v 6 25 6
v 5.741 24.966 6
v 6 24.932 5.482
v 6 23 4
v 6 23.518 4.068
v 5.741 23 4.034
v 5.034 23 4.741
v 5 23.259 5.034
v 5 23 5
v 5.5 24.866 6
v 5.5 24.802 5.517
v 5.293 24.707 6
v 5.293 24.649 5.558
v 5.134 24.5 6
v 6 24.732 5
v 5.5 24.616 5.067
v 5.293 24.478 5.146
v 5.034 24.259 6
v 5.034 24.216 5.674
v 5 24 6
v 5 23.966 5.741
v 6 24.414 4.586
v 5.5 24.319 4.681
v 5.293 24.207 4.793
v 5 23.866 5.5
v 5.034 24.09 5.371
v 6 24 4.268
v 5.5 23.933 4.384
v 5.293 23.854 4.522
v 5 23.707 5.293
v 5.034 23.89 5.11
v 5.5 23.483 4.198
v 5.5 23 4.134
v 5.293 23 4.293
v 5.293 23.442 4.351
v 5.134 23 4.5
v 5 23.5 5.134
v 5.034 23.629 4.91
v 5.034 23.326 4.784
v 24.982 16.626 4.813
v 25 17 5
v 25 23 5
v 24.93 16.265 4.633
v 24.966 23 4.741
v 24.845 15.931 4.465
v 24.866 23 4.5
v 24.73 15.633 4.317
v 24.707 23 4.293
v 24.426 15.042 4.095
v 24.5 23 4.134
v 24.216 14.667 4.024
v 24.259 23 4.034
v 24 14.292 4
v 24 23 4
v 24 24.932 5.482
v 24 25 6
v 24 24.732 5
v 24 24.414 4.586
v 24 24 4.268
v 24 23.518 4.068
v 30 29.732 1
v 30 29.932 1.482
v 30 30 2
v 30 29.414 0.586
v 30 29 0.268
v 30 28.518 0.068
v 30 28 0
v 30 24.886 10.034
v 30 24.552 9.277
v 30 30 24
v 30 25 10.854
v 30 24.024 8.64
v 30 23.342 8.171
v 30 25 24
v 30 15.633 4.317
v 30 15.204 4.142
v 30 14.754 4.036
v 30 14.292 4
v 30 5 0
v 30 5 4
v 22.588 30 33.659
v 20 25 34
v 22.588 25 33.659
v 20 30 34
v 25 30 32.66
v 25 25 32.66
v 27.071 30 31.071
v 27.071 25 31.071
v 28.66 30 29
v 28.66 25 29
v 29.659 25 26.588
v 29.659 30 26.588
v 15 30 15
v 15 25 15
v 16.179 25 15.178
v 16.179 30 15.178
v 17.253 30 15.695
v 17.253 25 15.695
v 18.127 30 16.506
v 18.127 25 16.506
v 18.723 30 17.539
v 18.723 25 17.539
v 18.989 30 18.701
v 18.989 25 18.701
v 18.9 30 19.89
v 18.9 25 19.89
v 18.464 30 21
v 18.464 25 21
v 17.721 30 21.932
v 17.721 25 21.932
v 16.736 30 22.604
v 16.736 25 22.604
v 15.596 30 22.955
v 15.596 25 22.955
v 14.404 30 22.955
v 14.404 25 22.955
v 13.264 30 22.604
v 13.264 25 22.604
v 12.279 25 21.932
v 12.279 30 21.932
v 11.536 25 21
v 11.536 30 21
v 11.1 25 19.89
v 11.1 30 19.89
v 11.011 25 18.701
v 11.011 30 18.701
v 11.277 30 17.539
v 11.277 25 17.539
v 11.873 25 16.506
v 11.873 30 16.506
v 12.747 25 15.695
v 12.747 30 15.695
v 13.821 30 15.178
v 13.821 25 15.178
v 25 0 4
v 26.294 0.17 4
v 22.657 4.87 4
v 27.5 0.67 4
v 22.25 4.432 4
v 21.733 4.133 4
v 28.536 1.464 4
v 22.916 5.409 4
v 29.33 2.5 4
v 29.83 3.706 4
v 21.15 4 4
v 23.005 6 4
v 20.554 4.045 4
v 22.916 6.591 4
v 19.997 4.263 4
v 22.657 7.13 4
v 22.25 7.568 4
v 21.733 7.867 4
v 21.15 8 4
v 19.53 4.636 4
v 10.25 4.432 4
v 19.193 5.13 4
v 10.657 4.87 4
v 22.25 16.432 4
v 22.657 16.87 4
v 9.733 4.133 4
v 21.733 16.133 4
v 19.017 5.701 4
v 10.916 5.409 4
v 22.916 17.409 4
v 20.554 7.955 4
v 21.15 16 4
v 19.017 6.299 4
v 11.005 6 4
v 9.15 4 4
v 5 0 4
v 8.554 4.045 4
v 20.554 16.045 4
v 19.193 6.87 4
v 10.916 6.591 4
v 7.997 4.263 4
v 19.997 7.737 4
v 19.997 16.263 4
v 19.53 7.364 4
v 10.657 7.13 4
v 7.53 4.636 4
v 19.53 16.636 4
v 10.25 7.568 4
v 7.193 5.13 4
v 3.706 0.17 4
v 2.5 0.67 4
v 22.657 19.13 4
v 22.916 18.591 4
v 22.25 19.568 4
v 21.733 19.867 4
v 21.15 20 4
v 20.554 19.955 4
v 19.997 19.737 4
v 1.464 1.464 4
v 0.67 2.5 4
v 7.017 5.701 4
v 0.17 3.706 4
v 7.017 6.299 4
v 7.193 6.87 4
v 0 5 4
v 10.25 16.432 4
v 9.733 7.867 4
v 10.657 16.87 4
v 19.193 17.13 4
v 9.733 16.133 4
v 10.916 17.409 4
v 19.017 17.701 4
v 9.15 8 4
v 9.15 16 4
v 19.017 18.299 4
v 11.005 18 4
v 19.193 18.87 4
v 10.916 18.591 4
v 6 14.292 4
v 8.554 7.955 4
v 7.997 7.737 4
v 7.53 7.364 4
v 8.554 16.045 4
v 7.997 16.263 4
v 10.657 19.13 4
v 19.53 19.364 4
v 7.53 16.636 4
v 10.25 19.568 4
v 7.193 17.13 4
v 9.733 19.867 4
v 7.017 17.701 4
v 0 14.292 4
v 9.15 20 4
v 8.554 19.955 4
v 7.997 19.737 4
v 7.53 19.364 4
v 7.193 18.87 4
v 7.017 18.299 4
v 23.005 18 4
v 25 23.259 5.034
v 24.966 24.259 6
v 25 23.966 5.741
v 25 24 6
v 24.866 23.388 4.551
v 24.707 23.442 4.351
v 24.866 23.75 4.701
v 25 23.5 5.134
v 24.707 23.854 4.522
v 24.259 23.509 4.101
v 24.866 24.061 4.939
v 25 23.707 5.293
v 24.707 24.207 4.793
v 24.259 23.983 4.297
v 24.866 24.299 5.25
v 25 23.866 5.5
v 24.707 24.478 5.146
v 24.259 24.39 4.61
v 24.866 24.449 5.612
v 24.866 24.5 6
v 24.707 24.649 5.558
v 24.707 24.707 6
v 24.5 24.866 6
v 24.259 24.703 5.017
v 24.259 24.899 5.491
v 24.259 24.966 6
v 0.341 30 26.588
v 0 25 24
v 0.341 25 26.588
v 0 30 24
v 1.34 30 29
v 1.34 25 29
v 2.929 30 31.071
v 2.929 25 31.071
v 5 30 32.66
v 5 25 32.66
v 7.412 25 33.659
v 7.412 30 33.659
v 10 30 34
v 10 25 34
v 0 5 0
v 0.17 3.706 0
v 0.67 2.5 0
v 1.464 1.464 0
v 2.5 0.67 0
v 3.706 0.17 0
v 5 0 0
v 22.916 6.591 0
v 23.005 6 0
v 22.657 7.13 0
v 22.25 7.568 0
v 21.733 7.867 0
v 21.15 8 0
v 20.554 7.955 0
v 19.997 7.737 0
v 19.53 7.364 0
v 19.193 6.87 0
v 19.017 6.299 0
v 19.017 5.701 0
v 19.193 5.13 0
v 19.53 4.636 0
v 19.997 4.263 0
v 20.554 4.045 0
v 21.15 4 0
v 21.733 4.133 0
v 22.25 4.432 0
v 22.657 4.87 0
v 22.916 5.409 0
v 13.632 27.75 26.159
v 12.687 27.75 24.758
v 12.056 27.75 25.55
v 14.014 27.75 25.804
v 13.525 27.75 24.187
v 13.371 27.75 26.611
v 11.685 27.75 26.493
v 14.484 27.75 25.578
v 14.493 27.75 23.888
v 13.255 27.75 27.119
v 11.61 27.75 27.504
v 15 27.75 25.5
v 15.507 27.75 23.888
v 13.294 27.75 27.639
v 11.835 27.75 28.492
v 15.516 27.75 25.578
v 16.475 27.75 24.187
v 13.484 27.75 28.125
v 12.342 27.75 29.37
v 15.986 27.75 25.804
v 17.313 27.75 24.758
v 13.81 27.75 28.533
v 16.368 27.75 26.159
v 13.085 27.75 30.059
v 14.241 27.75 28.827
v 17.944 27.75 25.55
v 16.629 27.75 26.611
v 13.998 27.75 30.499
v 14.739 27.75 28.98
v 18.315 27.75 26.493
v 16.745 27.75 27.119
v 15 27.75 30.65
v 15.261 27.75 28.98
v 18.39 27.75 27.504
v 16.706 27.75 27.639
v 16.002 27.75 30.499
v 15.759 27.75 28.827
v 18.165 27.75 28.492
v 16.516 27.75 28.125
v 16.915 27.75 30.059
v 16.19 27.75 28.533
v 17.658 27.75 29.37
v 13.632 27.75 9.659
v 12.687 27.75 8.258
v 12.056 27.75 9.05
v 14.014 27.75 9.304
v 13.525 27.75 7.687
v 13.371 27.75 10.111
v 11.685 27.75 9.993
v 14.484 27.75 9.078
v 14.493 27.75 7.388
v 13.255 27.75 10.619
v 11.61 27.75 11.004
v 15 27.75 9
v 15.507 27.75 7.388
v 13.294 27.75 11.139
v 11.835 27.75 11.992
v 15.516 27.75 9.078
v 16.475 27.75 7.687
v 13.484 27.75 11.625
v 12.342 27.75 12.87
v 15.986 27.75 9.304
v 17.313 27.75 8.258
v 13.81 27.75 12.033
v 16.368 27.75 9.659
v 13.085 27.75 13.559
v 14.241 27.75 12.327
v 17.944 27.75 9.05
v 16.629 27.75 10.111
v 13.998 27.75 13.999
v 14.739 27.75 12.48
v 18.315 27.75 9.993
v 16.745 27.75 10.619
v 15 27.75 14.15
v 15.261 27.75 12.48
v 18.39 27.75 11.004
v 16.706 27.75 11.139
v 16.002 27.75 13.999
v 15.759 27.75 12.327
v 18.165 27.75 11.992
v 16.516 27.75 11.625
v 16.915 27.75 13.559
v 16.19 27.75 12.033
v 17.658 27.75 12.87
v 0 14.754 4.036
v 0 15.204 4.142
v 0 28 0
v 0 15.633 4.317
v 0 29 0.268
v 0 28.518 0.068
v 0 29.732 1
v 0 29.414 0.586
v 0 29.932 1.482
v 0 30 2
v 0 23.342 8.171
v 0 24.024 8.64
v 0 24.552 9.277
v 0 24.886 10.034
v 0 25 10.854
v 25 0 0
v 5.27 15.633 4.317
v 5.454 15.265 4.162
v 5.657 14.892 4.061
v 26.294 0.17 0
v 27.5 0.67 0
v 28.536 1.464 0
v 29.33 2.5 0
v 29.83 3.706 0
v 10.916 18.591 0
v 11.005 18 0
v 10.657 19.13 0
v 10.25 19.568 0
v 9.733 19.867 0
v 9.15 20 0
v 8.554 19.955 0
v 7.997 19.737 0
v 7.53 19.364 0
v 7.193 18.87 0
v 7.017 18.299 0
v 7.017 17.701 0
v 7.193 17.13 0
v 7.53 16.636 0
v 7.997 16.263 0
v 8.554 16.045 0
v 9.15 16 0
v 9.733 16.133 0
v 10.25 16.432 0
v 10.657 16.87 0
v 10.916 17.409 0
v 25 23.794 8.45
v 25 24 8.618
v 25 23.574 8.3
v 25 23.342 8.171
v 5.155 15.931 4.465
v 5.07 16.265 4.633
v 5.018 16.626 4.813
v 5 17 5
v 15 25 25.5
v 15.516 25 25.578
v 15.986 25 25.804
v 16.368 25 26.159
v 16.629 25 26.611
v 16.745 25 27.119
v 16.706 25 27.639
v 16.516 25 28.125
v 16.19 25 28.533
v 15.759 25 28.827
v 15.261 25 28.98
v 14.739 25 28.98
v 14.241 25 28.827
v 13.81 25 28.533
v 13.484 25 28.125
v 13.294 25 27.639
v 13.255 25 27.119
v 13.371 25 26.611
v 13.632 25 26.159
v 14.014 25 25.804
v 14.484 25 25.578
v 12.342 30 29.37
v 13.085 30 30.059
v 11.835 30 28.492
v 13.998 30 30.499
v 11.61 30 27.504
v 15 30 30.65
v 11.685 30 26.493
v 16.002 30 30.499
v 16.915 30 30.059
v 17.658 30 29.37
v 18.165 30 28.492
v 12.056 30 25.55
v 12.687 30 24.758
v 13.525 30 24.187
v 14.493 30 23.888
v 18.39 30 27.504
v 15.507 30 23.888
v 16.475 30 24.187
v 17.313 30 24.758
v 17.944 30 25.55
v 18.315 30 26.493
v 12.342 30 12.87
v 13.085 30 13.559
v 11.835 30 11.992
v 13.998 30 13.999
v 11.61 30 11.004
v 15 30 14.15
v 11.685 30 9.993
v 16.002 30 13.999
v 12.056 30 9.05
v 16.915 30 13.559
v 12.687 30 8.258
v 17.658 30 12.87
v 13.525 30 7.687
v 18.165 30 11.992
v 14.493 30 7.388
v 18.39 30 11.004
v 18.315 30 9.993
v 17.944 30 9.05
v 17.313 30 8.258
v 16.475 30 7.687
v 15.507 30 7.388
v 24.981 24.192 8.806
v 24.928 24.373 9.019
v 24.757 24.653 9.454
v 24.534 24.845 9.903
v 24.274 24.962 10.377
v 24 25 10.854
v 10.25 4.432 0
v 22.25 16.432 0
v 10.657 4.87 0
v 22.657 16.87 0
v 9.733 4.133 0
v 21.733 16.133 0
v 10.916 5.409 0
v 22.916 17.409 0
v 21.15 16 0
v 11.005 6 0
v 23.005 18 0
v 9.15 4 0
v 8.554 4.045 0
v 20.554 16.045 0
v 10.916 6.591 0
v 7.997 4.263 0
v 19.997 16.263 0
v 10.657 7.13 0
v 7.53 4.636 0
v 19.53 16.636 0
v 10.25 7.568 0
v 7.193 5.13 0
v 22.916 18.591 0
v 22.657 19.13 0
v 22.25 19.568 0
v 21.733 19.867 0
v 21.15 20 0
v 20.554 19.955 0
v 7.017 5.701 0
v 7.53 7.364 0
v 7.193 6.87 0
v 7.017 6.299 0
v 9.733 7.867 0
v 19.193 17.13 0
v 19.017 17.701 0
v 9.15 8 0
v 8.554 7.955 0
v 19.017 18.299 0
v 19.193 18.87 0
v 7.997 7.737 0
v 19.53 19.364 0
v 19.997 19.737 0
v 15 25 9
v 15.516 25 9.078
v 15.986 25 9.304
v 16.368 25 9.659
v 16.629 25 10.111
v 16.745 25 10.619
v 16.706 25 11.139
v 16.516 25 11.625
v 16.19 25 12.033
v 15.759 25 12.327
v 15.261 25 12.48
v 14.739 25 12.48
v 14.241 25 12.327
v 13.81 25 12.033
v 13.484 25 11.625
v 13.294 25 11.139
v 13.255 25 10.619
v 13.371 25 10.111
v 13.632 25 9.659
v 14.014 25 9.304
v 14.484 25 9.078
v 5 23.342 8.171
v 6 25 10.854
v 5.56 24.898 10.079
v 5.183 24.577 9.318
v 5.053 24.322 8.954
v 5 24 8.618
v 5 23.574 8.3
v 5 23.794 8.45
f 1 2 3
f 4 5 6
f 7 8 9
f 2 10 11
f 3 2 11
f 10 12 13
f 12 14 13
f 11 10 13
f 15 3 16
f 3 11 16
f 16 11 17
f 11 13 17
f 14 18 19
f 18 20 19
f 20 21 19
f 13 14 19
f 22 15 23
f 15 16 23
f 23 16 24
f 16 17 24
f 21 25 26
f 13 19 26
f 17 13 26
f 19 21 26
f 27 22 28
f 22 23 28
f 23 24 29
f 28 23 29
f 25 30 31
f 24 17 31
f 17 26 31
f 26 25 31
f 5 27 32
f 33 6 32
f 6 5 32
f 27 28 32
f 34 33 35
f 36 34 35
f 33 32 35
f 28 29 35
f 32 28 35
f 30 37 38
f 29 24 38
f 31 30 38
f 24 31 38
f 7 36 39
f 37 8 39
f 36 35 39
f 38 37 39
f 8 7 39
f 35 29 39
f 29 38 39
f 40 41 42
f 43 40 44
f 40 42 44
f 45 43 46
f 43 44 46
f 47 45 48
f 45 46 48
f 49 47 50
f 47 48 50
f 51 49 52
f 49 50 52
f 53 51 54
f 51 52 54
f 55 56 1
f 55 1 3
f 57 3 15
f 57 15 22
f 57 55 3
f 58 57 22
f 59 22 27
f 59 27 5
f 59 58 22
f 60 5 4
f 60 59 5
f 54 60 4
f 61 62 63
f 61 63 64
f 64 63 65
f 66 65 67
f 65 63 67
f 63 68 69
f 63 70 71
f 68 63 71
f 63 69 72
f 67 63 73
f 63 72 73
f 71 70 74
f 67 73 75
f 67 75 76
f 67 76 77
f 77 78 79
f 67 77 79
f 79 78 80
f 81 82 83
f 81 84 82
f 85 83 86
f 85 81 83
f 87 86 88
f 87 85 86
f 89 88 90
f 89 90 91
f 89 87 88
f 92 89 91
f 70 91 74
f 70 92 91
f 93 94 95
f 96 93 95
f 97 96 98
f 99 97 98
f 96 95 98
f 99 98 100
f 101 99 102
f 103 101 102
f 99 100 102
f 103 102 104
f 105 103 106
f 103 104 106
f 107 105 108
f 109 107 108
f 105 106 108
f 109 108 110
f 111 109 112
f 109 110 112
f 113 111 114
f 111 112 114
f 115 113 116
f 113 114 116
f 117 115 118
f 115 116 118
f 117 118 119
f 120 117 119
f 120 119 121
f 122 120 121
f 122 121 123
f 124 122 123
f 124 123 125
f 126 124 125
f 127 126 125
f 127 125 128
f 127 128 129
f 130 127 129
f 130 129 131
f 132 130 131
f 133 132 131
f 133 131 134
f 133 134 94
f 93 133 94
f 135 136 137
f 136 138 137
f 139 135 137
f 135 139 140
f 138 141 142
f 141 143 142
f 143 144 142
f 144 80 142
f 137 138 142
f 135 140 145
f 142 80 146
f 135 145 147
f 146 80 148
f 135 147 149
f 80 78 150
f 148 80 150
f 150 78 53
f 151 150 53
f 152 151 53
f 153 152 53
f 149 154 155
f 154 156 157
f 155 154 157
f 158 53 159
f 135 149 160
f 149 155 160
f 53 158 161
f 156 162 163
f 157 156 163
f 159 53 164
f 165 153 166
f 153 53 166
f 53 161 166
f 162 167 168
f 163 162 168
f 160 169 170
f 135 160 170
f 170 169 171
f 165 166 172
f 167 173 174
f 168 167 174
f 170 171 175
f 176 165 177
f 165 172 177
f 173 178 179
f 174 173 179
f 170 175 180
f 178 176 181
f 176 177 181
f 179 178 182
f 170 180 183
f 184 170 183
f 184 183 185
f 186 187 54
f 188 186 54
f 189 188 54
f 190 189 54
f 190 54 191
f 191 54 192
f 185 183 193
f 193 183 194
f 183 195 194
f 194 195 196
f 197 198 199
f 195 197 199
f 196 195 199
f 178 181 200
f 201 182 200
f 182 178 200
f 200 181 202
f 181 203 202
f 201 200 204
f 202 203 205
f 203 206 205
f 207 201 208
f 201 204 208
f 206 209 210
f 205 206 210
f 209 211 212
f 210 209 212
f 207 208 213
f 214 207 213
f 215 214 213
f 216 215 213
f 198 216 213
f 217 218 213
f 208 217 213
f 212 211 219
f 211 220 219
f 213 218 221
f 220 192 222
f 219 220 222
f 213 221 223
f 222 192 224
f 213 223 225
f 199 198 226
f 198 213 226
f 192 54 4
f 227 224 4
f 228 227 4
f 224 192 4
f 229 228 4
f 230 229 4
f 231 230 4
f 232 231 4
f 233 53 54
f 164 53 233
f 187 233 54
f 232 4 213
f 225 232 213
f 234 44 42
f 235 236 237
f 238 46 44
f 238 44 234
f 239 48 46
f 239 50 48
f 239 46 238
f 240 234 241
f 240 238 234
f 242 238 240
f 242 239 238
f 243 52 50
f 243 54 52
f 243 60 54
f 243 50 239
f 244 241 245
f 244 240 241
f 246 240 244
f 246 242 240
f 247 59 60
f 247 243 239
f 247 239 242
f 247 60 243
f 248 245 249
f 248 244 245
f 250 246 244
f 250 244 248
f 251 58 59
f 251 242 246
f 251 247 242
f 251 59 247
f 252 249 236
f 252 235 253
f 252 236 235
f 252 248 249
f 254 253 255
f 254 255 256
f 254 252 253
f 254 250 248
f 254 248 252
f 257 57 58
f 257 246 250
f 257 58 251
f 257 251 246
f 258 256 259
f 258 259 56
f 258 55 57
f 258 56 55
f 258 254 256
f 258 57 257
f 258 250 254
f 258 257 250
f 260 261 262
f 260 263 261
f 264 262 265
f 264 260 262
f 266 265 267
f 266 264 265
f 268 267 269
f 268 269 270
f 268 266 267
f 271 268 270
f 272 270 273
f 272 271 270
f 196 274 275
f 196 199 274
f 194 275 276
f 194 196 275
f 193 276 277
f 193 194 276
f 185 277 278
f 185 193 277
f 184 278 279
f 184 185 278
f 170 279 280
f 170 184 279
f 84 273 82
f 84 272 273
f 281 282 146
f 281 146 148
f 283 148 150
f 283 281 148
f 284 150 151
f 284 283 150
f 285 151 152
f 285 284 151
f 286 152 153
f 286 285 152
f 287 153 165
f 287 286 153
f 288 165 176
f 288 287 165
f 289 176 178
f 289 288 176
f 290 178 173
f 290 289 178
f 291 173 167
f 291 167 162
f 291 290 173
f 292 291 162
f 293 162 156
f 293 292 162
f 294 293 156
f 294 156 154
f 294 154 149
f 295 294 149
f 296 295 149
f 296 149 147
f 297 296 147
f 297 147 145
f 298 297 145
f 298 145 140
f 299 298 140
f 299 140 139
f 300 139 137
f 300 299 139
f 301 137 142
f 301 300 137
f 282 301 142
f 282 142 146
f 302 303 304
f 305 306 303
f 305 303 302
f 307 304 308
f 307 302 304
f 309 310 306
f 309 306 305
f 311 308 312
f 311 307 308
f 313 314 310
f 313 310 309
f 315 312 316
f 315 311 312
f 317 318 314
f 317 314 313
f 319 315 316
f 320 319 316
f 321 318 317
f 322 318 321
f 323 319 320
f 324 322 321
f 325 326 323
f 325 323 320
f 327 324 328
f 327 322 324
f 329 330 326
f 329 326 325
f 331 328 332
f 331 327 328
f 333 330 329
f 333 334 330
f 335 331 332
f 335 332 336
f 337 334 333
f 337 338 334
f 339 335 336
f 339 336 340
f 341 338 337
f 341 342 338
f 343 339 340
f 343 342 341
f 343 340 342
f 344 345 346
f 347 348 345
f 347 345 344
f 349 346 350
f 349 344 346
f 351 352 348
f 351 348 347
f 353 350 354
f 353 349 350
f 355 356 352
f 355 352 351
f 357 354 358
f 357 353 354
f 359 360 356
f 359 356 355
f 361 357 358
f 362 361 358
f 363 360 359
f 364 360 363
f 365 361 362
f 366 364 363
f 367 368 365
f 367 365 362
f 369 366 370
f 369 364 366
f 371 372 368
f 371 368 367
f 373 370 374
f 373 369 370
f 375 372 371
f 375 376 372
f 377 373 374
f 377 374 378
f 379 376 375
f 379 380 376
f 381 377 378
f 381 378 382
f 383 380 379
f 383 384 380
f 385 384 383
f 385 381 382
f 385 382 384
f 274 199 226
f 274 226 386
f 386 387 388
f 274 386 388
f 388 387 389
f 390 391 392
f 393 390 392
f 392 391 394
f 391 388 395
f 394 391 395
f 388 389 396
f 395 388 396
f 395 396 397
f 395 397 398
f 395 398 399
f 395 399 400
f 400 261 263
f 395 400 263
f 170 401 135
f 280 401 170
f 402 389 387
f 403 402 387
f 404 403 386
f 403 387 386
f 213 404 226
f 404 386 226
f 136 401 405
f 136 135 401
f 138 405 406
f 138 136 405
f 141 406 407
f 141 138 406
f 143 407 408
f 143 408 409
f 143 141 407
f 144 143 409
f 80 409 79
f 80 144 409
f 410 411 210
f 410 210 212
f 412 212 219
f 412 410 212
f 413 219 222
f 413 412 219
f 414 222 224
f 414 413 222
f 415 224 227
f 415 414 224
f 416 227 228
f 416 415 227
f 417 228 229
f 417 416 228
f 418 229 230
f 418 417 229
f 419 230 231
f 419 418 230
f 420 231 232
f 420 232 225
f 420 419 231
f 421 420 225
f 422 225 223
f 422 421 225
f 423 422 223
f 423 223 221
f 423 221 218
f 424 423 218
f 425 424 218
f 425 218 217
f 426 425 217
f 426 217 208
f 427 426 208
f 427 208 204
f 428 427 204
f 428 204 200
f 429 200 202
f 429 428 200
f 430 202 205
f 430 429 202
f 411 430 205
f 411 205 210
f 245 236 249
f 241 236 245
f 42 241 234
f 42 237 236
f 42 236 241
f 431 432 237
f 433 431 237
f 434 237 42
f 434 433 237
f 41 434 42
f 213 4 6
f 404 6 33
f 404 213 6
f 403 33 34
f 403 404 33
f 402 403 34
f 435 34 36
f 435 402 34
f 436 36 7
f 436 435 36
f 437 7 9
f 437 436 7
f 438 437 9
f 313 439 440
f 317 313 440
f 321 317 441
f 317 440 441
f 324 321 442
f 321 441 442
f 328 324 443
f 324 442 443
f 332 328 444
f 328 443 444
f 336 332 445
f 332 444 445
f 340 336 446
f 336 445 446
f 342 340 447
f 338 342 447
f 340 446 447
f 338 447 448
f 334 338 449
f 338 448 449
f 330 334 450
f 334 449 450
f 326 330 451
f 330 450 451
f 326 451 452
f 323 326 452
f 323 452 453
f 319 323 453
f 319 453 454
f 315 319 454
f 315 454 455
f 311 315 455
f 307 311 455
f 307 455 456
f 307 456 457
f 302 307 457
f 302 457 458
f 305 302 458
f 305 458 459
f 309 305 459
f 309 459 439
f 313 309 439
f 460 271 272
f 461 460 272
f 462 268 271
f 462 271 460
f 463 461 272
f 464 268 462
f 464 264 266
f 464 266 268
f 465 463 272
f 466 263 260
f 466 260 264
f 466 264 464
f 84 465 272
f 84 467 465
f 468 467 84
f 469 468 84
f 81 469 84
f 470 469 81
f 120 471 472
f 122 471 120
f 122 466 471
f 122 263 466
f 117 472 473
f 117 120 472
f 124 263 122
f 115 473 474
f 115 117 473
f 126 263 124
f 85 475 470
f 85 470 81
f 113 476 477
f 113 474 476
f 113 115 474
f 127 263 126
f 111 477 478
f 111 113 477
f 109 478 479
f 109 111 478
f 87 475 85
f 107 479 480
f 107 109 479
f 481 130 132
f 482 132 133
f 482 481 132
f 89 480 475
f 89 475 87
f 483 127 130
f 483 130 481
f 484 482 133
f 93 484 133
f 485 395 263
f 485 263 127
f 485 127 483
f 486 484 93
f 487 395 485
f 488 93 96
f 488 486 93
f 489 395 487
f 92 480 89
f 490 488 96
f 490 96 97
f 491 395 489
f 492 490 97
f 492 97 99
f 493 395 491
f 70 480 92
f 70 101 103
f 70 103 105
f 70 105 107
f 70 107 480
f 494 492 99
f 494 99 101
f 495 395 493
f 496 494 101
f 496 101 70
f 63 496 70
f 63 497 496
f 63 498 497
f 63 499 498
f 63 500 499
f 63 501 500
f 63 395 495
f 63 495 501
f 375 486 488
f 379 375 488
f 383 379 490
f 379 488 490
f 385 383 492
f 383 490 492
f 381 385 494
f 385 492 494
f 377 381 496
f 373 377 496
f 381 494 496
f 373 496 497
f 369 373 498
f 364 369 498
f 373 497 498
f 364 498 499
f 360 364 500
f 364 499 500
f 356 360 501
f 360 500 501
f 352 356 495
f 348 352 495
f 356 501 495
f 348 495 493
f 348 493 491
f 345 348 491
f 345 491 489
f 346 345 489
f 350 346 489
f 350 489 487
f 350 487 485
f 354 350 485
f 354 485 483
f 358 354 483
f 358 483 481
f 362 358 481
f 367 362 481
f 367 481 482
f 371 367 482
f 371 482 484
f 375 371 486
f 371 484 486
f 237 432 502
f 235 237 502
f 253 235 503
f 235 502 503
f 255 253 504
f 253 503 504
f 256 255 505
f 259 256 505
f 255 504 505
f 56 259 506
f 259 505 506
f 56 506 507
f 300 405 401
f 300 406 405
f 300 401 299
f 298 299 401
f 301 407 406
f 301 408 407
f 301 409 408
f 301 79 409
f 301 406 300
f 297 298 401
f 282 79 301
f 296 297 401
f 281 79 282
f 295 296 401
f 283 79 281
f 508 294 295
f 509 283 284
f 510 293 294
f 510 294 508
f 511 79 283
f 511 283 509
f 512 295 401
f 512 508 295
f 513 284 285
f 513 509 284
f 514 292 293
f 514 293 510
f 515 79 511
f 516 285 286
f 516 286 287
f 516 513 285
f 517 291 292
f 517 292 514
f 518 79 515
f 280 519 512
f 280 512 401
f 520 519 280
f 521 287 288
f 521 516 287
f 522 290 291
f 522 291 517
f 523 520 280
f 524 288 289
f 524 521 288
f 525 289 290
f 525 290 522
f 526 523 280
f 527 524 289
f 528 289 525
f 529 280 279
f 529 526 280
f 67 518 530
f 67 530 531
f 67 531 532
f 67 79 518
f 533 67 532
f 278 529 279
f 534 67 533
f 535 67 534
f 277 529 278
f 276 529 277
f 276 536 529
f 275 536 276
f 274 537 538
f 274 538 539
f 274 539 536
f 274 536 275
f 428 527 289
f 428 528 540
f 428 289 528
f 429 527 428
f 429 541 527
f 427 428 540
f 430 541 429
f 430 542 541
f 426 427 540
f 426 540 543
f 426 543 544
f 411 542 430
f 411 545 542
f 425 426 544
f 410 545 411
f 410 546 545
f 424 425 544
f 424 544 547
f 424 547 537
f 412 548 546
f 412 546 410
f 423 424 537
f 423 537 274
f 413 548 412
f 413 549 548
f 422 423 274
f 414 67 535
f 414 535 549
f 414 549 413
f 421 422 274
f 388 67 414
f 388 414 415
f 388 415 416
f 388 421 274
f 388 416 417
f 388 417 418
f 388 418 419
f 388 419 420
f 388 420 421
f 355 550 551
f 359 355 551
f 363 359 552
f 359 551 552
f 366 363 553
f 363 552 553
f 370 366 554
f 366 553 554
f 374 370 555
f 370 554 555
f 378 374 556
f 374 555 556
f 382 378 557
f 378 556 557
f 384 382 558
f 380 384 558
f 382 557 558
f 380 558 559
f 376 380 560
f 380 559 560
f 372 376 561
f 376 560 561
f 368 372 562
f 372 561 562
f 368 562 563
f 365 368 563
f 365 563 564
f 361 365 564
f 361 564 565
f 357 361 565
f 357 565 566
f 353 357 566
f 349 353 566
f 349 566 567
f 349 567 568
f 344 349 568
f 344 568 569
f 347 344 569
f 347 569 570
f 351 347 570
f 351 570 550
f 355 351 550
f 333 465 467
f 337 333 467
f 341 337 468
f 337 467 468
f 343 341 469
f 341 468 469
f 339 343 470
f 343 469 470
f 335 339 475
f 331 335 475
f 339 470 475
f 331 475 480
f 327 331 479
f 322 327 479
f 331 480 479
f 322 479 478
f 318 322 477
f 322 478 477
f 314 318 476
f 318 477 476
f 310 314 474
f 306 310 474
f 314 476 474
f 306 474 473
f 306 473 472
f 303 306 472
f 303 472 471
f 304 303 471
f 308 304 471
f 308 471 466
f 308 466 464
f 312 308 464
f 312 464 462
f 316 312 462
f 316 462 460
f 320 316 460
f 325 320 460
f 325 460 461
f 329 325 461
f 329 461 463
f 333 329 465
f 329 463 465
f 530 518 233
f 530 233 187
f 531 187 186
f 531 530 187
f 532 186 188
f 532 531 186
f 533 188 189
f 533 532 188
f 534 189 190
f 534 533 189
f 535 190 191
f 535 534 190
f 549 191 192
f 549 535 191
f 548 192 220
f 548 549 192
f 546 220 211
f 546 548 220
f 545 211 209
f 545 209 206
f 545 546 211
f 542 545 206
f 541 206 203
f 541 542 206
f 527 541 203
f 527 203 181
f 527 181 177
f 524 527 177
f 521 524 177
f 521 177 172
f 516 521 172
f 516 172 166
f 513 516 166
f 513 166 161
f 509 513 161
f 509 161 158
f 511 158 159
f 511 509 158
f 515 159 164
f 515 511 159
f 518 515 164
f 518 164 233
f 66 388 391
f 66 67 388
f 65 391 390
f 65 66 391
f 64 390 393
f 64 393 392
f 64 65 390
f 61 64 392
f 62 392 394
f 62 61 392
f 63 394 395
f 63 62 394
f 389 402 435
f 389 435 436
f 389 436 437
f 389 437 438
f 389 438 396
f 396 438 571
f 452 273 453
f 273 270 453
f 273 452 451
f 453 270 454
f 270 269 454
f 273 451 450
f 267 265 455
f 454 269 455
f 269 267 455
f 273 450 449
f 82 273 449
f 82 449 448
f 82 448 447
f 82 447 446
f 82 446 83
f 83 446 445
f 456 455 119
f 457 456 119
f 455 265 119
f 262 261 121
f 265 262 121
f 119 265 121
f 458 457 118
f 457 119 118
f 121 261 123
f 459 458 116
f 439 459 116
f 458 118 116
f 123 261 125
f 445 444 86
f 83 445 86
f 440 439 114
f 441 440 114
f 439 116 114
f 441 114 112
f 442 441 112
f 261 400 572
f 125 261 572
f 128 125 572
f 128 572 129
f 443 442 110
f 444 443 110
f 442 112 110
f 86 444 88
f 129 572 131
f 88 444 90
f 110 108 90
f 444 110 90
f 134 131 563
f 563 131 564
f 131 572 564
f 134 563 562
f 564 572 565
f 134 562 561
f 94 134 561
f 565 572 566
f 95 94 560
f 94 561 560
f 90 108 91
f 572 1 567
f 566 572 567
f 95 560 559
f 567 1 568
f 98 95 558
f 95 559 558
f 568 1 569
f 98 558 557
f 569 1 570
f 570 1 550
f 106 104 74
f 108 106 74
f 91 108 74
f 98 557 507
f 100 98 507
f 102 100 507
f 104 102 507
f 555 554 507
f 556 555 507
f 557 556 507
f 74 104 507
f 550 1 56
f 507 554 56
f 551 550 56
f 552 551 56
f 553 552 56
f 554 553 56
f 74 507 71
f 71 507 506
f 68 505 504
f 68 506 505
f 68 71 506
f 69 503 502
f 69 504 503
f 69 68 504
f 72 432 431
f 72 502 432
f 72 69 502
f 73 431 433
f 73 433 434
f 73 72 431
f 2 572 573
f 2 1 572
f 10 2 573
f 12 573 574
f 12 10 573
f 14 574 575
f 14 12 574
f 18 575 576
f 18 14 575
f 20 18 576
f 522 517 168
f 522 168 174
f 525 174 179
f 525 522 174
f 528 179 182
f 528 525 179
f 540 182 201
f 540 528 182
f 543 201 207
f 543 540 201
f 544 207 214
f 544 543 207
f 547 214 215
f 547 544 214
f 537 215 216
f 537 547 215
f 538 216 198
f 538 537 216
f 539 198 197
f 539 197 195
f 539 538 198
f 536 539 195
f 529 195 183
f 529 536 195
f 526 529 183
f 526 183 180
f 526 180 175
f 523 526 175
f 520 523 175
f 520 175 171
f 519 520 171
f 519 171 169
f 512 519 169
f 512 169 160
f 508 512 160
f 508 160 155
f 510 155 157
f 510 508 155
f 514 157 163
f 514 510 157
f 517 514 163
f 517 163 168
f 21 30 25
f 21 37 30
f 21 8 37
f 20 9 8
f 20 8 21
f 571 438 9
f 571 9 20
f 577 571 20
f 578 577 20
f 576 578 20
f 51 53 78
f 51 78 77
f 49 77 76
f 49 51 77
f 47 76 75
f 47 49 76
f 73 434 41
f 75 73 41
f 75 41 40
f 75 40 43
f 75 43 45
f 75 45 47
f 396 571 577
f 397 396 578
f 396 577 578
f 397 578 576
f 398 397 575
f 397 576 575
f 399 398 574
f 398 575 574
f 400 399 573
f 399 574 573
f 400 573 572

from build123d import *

# Parameters (mm, degrees)
CROQUIS1_R              = 2.005138112
SALIENTE_EXTRUIR1_DEPTH = 4
CROQUIS2_W              = 30
CROQUIS2_H              = 5
SALIENTE_EXTRUIR2_DEPTH = 30
CROQUIS3_R              = 1.75
CROQUIS3_R_2            = 4
CORTAR_EXTRUIR1_DEPTH   = 52.778373864
REDONDEO1_R             = 10
REDONDEO2_R             = 5
REDONDEO4_R             = 2
CROQUIS4_R              = 3.4
CORTAR_EXTRUIR2_DEPTH   = 2.25
NERVIO12_REACH          = 56.369
CROQUIS7_WALL_W         = 121.91855764
CROQUIS7_WALL_H         = 5
NERVIO13_REACH          = 56.369
CROQUIS8_WALL_W         = 121.91855764
CROQUIS8_WALL_H         = 5
REDONDEO6_R             = 3
REDONDEO7_R             = 2
REDONDEO8_R             = 1


with BuildPart() as part:
    # Croquis1 → Saliente-Extruir1 (new body)
    with BuildSketch(Plane.XY):
        Polygon((0, 21.15), (0, 30), (30, 30), (30, 21.15), (30, 14.85), (30, 0), (0, 0), (0, 14.85), align=None)
        with Locations((9, 18)):
            Circle(CROQUIS1_R, mode=Mode.SUBTRACT)
        with Locations((21, 18)):
            Circle(CROQUIS1_R, mode=Mode.SUBTRACT)
        with Locations((21, 6)):
            Circle(CROQUIS1_R, mode=Mode.SUBTRACT)
        with Locations((9, 6)):
            Circle(CROQUIS1_R, mode=Mode.SUBTRACT)
    extrude(amount=SALIENTE_EXTRUIR1_DEPTH)

    # Croquis2 → Saliente-Extruir2 (add)
    with BuildSketch(Plane.XY.offset(4)):
        with Locations((15, 27.5)):
            Rectangle(CROQUIS2_W, CROQUIS2_H)
    extrude(amount=SALIENTE_EXTRUIR2_DEPTH)

    # Croquis3 → Cortar-Extruir1 (cut, through all)
    with BuildSketch(Plane.XZ.offset(-25)):
        with Locations(Location((15, 27.25, 0), (0, 0, 270))):
            Circle(CROQUIS3_R)
        with Locations(Location((15, 10.75, 0), (0, 0, 270))):
            Circle(CROQUIS3_R)
        with Locations(Location((15, 19, 0), (0, 0, 270))):
            Circle(CROQUIS3_R_2)
    extrude(amount=-CORTAR_EXTRUIR1_DEPTH, mode=Mode.SUBTRACT)

    # Redondeo1
    redondeo1_edges = [part.edges().sort_by_distance(p)[0] for p in [
        (0, 27.5, 34),
        (30, 27.5, 34),
    ]]
    fillet(redondeo1_edges, radius=REDONDEO1_R)

    # Redondeo2
    redondeo2_edges = [part.edges().sort_by_distance(p)[0] for p in [
        (30, 0, 2),
        (0, 0, 2),
    ]]
    fillet(redondeo2_edges, radius=REDONDEO2_R)

    # Redondeo4
    redondeo4_edges = [part.edges().sort_by_distance(p)[0] for p in [
        (15, 30, 0),
    ]]
    fillet(redondeo4_edges, radius=REDONDEO4_R)

    # Croquis4 → Cortar-Extruir2 (cut)
    with BuildSketch(Plane(origin=(0, 30, 0), x_dir=(1, 0, 0), z_dir=(0, 1, 0))):
        with Locations(Location((15, -10.75, 0), (0, 0, 270))):
            Circle(CROQUIS4_R)
        with Locations(Location((15, -27.25, 0), (0, 0, 270))):
            Circle(CROQUIS4_R)
    extrude(amount=-CORTAR_EXTRUIR2_DEPTH, mode=Mode.SUBTRACT)

    # Croquis7 wall → Nervio12 (add, up to next)
    with BuildSketch(Plane(origin=(30, 20, 6.5), x_dir=(0, -0.894427191, -0.4472135955), z_dir=(0, 0.4472135955, -0.894427191)), mode=Mode.PRIVATE) as nervio12_sk1:
        with Locations((0, 2.5)):
            Rectangle(CROQUIS7_WALL_W, CROQUIS7_WALL_H)
    nervio12_tool1 = extrude(nervio12_sk1.sketch, amount=NERVIO12_REACH, mode=Mode.PRIVATE) - part.part
    add(nervio12_tool1.solids().sort_by_distance((30, 20, 6.5))[0])

    # Croquis8 wall → Nervio13 (add, up to next)
    with BuildSketch(Plane(origin=(0, 20, 6.5), x_dir=(0, 0.894427191, 0.4472135955), z_dir=(0, 0.4472135955, -0.894427191)), mode=Mode.PRIVATE) as nervio13_sk1:
        with Locations((0, 2.5)):
            Rectangle(CROQUIS8_WALL_W, CROQUIS8_WALL_H)
    nervio13_tool1 = extrude(nervio13_sk1.sketch, amount=NERVIO13_REACH, mode=Mode.PRIVATE) - part.part
    add(nervio13_tool1.solids().sort_by_distance((0, 20, 6.5))[0])

    # Redondeo6
    redondeo6_edges = [part.edges().sort_by_distance(p)[0] for p in [
        (27.5, 25, 9),
        (27.5, 15, 4),
        (2.5, 25, 9),
        (2.5, 15, 4),
    ]]
    fillet(redondeo6_edges, radius=REDONDEO6_R)

    # Redondeo7
    redondeo7_edges = [part.edges().sort_by_distance(p)[0] for p in [
        (15, 25, 4),
    ]]
    fillet(redondeo7_edges, radius=REDONDEO7_R)

    # Redondeo8
    redondeo8_edges = [part.edges().sort_by_distance(p)[0] for p in [
        (5, 25, 8.427050983),
        (5, 24.414213562, 4.585786438),
        (5, 18.645898034, 4),
        (25, 25, 8.427050983),
        (25, 24.414213562, 4.585786438),
        (25, 18.645898034, 4),
    ]]
    fillet(redondeo8_edges, radius=REDONDEO8_R)


solid = part.part
